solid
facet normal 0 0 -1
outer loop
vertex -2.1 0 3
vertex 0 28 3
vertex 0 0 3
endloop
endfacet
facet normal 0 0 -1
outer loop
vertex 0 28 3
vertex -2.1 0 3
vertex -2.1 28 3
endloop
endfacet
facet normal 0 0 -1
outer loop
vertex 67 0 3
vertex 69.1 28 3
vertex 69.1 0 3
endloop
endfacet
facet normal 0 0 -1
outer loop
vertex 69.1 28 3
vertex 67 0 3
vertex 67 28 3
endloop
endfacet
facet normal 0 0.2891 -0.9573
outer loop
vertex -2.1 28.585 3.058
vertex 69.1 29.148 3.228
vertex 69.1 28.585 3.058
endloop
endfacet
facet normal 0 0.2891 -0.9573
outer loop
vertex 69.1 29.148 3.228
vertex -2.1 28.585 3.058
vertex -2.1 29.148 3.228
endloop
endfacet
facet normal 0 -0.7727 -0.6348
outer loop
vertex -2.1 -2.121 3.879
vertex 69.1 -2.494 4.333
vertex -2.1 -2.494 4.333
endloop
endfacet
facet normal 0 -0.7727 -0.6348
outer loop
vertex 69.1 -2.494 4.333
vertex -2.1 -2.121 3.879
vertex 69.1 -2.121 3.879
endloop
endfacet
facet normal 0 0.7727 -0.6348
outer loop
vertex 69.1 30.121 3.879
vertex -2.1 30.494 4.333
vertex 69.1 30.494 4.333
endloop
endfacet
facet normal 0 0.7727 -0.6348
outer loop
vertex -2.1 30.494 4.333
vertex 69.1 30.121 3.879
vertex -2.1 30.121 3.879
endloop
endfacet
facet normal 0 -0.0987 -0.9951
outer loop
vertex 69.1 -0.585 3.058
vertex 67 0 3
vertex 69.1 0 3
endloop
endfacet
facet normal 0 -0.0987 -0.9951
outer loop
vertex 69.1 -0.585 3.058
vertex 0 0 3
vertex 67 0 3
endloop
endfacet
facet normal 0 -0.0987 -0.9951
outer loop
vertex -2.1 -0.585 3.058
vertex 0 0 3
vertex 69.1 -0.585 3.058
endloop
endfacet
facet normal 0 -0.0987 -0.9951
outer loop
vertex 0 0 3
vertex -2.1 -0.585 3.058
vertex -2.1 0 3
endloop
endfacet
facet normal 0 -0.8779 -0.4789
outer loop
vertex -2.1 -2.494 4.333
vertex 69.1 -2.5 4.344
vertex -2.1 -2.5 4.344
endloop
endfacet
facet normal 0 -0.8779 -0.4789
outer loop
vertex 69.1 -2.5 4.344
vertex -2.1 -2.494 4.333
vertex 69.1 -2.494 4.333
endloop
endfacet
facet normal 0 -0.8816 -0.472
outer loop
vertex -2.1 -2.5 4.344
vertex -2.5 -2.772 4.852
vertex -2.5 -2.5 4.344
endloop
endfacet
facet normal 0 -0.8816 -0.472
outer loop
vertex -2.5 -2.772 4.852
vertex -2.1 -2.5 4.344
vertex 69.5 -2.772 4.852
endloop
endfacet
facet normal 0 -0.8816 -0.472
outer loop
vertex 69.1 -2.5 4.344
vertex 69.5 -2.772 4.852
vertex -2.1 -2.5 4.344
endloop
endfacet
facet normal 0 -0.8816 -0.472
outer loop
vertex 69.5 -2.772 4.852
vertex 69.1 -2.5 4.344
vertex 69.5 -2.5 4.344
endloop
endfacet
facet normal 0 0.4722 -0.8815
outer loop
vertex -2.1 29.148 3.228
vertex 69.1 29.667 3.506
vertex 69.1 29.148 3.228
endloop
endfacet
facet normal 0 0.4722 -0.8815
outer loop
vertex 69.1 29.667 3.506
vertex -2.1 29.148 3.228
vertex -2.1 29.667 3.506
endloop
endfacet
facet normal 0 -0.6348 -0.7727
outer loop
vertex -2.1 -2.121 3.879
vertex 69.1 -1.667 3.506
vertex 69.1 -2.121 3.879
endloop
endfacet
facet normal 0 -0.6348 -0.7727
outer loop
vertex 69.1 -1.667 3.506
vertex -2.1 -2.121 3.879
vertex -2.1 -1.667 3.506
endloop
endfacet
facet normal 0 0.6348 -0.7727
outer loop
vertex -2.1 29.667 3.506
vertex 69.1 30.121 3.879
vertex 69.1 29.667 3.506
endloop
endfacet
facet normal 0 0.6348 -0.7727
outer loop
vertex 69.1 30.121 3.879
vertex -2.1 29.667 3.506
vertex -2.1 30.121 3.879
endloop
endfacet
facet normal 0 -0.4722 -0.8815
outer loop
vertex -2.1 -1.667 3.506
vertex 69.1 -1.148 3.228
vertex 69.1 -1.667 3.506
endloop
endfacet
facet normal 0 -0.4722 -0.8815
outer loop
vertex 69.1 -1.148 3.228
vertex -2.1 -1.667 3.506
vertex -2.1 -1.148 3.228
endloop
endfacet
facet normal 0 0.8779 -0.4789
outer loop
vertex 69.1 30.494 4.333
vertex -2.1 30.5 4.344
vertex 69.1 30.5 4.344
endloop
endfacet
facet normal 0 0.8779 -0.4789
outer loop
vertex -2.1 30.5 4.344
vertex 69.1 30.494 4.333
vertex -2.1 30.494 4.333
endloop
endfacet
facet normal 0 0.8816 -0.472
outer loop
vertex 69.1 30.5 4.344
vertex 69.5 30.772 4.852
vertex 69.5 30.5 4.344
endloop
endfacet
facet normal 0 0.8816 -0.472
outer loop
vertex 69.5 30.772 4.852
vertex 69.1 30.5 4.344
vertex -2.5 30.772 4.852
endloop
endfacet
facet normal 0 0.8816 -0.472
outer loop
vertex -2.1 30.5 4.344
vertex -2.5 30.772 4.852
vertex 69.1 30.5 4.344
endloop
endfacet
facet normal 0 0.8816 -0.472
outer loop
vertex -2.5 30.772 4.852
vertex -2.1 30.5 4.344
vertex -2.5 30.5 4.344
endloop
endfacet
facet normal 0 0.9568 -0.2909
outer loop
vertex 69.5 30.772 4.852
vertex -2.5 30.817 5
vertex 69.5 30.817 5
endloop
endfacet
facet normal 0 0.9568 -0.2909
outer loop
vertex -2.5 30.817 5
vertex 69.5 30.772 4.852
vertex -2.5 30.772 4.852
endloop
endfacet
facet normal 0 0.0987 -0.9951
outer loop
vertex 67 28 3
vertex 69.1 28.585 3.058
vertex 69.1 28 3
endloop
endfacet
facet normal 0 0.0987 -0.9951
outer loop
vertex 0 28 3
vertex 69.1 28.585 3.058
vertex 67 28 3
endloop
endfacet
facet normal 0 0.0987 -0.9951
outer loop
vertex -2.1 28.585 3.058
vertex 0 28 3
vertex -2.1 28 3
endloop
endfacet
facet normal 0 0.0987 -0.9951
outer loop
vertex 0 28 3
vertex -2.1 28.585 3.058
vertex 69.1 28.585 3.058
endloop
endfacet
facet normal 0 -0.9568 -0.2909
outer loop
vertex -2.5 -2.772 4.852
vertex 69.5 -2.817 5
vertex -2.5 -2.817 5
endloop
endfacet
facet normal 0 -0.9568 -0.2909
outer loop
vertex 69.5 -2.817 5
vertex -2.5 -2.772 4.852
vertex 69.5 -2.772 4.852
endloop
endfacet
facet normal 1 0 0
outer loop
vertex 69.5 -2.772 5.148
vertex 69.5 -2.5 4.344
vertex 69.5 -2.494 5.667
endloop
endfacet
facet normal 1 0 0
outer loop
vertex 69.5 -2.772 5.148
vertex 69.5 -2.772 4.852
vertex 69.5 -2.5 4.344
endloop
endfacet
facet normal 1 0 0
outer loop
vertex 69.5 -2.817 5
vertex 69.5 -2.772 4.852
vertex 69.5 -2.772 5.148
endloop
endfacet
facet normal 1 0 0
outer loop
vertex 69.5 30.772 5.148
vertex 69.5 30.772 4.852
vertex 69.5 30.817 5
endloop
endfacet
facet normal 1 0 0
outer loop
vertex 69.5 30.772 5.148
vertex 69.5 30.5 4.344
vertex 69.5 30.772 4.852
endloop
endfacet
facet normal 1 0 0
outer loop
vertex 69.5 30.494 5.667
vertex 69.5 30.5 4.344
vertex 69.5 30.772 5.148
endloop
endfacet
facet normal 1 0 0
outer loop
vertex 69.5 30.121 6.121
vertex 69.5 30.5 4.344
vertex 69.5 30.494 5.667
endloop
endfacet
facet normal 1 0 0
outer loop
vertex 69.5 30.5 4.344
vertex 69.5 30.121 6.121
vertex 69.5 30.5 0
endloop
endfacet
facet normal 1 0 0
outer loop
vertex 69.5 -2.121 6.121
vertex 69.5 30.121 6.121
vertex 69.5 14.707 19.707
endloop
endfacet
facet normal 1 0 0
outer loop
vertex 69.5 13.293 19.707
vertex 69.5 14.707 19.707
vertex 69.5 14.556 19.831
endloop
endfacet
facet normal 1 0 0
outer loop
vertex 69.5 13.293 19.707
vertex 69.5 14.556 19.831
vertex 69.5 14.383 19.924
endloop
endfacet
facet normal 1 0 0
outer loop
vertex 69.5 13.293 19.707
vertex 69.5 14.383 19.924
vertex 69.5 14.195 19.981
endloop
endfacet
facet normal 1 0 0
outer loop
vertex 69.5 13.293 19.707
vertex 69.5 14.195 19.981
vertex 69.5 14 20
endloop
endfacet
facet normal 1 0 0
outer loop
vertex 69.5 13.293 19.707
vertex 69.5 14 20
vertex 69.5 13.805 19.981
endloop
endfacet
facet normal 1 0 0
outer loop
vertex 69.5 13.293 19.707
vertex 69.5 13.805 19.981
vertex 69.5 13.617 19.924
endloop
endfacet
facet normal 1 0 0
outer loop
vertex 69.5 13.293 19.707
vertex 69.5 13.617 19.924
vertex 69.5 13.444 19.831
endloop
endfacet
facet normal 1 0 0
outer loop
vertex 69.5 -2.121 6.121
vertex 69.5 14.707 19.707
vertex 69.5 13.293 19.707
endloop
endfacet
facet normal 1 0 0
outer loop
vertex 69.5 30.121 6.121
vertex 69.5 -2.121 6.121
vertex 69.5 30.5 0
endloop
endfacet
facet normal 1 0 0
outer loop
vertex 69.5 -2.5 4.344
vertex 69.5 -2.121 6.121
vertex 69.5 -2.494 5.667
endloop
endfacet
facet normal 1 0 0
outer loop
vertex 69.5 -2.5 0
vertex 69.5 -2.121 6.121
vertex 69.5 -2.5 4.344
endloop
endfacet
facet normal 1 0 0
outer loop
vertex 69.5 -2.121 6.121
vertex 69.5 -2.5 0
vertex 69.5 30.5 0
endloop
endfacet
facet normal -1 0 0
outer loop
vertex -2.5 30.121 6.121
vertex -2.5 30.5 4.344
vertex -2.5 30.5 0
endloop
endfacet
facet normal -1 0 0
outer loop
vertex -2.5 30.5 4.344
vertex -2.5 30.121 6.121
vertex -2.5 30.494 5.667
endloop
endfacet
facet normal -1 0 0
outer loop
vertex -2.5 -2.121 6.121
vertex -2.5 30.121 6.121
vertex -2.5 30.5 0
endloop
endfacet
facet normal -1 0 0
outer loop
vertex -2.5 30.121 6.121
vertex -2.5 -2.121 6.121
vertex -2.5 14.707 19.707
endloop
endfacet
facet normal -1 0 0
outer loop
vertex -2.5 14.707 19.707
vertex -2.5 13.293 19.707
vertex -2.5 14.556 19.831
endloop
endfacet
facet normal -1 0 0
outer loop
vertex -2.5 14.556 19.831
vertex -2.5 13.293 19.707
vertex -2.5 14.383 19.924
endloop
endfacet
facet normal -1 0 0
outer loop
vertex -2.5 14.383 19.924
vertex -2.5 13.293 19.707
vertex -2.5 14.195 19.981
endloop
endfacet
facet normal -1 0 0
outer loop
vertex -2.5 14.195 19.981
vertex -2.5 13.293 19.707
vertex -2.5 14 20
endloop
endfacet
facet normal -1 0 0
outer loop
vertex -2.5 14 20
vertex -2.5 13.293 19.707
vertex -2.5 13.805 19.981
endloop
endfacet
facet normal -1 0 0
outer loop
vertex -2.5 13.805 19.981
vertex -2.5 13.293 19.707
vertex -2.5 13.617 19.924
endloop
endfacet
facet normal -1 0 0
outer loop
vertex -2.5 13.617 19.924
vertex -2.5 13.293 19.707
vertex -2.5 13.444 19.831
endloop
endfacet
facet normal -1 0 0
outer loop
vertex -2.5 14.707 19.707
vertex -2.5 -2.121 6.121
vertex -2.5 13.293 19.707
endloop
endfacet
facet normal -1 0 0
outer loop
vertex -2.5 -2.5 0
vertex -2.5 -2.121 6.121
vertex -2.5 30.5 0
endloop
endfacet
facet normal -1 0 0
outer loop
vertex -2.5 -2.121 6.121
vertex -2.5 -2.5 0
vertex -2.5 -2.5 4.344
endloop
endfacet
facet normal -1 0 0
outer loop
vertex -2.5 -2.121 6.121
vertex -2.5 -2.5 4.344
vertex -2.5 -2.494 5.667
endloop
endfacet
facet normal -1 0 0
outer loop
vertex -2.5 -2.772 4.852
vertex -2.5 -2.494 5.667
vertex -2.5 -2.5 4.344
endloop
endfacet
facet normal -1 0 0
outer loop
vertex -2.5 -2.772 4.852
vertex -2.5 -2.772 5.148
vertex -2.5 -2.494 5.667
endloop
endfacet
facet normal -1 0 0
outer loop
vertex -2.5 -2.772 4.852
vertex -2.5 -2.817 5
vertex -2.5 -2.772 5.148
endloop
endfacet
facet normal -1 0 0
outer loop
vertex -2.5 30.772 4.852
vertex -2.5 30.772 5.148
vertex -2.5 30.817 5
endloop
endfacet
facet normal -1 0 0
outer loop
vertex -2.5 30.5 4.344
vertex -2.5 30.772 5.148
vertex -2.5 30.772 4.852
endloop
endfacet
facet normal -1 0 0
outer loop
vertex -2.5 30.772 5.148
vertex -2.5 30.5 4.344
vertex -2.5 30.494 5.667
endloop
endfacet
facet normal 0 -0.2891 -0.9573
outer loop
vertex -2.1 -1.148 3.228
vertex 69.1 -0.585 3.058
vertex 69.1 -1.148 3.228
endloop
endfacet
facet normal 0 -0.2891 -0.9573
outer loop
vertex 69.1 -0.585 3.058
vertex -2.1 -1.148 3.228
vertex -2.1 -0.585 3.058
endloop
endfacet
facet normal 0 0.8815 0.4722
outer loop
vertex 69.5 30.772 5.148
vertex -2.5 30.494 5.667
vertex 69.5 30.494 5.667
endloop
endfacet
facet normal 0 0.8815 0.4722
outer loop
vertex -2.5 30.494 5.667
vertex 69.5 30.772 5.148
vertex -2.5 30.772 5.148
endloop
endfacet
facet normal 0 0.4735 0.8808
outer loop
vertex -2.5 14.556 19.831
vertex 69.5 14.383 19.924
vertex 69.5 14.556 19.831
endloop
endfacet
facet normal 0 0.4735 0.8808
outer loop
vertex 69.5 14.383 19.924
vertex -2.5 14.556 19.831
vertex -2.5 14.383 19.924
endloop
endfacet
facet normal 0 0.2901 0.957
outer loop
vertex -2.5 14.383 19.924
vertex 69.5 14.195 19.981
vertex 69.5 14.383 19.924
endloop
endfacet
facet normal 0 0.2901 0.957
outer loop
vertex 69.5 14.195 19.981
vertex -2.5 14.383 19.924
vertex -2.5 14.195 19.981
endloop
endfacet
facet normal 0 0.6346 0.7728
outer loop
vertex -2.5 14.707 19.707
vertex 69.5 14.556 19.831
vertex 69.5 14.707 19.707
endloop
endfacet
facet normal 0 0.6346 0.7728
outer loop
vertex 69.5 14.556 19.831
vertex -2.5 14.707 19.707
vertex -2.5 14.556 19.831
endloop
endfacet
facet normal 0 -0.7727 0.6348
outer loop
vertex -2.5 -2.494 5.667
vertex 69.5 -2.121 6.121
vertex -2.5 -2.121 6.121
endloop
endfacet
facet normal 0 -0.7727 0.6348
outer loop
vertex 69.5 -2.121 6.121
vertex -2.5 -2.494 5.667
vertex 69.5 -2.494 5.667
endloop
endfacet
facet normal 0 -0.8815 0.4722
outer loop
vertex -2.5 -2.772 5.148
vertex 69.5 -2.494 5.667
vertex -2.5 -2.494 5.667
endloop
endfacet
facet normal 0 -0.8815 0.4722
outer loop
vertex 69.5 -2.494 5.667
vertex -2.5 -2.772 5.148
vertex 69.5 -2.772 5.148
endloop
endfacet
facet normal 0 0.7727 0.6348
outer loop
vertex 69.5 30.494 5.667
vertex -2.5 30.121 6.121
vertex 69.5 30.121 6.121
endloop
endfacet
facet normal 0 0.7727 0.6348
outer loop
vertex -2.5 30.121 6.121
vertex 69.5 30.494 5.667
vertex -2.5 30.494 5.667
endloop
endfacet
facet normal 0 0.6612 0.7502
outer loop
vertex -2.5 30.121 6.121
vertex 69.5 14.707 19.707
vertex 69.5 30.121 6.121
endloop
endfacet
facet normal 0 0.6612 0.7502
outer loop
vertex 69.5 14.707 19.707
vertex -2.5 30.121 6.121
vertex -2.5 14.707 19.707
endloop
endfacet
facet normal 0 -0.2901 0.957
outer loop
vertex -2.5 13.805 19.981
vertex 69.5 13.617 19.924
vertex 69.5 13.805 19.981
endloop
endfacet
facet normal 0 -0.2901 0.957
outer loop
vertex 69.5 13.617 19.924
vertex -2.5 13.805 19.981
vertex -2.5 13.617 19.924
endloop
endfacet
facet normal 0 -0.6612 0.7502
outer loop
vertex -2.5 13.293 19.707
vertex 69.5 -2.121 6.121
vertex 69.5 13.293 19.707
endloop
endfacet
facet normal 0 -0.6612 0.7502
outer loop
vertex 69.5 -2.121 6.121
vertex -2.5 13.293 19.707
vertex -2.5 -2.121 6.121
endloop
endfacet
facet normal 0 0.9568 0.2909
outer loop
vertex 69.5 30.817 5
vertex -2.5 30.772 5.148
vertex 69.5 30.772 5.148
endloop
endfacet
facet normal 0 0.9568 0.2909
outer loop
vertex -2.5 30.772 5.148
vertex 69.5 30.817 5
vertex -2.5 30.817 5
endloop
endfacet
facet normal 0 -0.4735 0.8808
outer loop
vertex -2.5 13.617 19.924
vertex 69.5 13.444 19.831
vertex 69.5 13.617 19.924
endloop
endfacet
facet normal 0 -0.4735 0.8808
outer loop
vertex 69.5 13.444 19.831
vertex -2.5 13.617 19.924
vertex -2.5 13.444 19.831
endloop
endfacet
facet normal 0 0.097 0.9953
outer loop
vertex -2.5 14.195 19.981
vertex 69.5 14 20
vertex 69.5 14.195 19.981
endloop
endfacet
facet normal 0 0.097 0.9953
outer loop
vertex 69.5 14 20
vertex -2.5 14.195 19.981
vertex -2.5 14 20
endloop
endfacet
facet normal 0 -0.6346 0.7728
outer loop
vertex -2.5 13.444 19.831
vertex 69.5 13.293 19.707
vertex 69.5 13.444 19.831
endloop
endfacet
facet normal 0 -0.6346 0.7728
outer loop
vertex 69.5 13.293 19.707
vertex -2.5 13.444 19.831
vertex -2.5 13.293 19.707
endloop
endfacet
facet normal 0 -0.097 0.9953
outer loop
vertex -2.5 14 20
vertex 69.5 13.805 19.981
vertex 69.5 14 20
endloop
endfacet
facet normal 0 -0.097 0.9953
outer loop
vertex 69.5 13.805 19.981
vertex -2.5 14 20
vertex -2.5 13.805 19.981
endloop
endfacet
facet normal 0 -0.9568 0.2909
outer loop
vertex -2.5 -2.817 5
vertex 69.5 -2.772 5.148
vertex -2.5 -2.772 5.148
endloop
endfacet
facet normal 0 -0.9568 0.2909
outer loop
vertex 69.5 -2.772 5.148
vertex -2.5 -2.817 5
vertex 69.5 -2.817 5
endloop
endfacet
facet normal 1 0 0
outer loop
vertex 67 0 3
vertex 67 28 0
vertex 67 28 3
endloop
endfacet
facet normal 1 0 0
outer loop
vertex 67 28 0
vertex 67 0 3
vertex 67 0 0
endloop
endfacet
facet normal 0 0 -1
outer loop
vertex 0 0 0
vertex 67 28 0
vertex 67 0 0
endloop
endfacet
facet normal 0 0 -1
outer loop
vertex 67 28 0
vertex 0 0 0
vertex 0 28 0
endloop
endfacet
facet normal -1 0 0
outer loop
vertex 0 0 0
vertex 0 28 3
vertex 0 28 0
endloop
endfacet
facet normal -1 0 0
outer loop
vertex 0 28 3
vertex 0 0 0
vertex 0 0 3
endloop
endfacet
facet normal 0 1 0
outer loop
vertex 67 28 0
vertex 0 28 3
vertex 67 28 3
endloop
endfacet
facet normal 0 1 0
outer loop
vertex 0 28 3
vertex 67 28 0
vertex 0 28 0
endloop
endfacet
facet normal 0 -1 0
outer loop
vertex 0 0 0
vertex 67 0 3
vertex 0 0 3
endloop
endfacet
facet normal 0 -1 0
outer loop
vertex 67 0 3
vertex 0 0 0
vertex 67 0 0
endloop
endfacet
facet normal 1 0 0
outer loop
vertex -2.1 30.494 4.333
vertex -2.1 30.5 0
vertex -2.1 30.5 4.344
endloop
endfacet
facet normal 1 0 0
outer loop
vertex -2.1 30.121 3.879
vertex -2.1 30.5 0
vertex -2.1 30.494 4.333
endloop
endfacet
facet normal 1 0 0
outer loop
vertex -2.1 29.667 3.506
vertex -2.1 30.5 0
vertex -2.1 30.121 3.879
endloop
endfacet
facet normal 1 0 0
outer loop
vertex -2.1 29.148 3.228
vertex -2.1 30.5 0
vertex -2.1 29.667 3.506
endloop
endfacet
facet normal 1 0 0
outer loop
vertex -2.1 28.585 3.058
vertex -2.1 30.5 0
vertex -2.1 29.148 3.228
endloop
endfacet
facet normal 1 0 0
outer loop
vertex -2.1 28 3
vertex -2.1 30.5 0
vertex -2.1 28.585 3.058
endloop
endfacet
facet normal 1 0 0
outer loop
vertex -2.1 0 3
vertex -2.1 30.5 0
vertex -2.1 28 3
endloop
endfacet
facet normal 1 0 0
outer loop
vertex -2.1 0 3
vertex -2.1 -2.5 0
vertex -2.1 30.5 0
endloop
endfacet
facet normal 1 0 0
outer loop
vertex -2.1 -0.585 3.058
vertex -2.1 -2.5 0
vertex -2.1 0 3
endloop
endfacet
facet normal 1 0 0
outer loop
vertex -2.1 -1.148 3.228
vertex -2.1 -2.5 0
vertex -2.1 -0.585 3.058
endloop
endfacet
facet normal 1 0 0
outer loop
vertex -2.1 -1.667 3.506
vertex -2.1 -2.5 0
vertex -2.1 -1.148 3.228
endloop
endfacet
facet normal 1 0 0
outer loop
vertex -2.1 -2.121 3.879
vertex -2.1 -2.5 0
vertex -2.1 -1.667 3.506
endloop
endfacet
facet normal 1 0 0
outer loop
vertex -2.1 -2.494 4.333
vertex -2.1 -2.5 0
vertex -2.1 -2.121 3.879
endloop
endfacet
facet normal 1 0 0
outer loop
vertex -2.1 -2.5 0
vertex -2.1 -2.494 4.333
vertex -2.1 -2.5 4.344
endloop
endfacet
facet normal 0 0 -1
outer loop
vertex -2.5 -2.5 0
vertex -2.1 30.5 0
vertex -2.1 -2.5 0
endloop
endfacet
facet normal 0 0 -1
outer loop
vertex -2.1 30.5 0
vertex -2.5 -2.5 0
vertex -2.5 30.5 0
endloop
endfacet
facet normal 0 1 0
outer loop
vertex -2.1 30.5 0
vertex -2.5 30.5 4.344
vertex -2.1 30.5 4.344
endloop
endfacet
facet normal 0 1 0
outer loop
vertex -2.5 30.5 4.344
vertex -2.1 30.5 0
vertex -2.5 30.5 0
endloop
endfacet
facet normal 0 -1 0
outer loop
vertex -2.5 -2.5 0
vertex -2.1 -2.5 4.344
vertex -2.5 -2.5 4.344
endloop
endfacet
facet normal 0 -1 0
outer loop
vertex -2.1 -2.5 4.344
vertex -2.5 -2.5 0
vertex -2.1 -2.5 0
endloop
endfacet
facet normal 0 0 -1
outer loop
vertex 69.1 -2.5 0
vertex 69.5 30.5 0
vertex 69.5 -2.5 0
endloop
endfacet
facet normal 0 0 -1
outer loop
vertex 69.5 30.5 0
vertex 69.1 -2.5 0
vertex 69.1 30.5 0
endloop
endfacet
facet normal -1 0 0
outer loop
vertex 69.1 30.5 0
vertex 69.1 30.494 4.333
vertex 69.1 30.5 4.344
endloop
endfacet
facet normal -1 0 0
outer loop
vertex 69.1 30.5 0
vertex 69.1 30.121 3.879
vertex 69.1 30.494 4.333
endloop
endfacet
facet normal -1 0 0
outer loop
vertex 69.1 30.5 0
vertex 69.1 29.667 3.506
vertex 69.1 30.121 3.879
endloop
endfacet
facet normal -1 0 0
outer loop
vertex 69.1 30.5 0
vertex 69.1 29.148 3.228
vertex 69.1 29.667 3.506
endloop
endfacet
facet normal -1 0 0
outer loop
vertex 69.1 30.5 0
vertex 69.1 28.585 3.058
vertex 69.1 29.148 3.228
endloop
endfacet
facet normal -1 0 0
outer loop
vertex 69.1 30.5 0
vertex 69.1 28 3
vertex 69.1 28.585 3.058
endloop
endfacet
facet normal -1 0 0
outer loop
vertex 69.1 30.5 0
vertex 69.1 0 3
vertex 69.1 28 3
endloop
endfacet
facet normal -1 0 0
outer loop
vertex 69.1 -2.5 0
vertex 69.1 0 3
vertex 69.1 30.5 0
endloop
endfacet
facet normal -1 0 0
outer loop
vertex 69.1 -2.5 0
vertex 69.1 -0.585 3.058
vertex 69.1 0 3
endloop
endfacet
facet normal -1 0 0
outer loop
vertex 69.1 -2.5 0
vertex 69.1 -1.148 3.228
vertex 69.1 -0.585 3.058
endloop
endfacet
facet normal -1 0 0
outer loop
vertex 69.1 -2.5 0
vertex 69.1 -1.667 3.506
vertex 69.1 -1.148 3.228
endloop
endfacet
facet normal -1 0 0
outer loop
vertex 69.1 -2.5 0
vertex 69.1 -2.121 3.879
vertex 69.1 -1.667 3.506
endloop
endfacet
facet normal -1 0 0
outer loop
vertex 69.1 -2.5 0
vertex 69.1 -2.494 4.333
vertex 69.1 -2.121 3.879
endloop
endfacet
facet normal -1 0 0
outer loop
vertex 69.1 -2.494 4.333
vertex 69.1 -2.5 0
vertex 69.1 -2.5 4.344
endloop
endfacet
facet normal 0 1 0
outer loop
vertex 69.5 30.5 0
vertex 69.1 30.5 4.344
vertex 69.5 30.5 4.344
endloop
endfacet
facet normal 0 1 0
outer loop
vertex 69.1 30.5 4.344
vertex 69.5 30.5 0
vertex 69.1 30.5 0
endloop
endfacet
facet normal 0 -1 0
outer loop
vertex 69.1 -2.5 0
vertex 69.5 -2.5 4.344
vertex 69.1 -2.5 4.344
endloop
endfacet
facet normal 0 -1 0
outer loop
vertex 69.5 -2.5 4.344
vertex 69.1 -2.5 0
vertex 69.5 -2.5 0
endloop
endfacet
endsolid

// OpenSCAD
w=28;
l=67;
overlap=5;
depth=3;

/* height= */

cube([l, w, depth]);

l2 = l+overlap;
w2 = w+overlap;

rh=15;

module roof() {
  hull() {
    translate([0, 0, 3+depth])
      rotate(90, [0, 1, 0])
      cylinder(h=l2, r=3);


    translate([0, -5+w2, 3+depth])
      rotate(90, [0, 1, 0])
      cylinder(h=l2, r=3);


    translate([0, -2.5+(w2/2), (3+depth + rh)])
      rotate(90, [0, 1, 0])
      cylinder(h=l2, r=1);
  }
}

module top_roof() {
  intersection() {
    translate([-50, -50, depth]) {
      translate([0, 0, 4]) {
        cube([200, 100, 50]);
      }
    }
    roof();
  }
}


module bot_roof() {
  intersection() {
    translate([-50, -50, depth]) {
        cube([200, 100, 2]);
    }
    roof();
  }
}


module squish_roof() {
  union() {
    bot_roof();
    translate([0, 0, -2])
      top_roof();
  }
}


$fn=32;
translate([-2.5, 0, 0]) {
  squish_roof();
  /* roof(); */
}

translate([-2.5, -2.5, 0])
#cube([0.4, w2, 5]);

translate([-2.9 + l2, -2.5, 0])
#cube([0.4, w2, 5]);
